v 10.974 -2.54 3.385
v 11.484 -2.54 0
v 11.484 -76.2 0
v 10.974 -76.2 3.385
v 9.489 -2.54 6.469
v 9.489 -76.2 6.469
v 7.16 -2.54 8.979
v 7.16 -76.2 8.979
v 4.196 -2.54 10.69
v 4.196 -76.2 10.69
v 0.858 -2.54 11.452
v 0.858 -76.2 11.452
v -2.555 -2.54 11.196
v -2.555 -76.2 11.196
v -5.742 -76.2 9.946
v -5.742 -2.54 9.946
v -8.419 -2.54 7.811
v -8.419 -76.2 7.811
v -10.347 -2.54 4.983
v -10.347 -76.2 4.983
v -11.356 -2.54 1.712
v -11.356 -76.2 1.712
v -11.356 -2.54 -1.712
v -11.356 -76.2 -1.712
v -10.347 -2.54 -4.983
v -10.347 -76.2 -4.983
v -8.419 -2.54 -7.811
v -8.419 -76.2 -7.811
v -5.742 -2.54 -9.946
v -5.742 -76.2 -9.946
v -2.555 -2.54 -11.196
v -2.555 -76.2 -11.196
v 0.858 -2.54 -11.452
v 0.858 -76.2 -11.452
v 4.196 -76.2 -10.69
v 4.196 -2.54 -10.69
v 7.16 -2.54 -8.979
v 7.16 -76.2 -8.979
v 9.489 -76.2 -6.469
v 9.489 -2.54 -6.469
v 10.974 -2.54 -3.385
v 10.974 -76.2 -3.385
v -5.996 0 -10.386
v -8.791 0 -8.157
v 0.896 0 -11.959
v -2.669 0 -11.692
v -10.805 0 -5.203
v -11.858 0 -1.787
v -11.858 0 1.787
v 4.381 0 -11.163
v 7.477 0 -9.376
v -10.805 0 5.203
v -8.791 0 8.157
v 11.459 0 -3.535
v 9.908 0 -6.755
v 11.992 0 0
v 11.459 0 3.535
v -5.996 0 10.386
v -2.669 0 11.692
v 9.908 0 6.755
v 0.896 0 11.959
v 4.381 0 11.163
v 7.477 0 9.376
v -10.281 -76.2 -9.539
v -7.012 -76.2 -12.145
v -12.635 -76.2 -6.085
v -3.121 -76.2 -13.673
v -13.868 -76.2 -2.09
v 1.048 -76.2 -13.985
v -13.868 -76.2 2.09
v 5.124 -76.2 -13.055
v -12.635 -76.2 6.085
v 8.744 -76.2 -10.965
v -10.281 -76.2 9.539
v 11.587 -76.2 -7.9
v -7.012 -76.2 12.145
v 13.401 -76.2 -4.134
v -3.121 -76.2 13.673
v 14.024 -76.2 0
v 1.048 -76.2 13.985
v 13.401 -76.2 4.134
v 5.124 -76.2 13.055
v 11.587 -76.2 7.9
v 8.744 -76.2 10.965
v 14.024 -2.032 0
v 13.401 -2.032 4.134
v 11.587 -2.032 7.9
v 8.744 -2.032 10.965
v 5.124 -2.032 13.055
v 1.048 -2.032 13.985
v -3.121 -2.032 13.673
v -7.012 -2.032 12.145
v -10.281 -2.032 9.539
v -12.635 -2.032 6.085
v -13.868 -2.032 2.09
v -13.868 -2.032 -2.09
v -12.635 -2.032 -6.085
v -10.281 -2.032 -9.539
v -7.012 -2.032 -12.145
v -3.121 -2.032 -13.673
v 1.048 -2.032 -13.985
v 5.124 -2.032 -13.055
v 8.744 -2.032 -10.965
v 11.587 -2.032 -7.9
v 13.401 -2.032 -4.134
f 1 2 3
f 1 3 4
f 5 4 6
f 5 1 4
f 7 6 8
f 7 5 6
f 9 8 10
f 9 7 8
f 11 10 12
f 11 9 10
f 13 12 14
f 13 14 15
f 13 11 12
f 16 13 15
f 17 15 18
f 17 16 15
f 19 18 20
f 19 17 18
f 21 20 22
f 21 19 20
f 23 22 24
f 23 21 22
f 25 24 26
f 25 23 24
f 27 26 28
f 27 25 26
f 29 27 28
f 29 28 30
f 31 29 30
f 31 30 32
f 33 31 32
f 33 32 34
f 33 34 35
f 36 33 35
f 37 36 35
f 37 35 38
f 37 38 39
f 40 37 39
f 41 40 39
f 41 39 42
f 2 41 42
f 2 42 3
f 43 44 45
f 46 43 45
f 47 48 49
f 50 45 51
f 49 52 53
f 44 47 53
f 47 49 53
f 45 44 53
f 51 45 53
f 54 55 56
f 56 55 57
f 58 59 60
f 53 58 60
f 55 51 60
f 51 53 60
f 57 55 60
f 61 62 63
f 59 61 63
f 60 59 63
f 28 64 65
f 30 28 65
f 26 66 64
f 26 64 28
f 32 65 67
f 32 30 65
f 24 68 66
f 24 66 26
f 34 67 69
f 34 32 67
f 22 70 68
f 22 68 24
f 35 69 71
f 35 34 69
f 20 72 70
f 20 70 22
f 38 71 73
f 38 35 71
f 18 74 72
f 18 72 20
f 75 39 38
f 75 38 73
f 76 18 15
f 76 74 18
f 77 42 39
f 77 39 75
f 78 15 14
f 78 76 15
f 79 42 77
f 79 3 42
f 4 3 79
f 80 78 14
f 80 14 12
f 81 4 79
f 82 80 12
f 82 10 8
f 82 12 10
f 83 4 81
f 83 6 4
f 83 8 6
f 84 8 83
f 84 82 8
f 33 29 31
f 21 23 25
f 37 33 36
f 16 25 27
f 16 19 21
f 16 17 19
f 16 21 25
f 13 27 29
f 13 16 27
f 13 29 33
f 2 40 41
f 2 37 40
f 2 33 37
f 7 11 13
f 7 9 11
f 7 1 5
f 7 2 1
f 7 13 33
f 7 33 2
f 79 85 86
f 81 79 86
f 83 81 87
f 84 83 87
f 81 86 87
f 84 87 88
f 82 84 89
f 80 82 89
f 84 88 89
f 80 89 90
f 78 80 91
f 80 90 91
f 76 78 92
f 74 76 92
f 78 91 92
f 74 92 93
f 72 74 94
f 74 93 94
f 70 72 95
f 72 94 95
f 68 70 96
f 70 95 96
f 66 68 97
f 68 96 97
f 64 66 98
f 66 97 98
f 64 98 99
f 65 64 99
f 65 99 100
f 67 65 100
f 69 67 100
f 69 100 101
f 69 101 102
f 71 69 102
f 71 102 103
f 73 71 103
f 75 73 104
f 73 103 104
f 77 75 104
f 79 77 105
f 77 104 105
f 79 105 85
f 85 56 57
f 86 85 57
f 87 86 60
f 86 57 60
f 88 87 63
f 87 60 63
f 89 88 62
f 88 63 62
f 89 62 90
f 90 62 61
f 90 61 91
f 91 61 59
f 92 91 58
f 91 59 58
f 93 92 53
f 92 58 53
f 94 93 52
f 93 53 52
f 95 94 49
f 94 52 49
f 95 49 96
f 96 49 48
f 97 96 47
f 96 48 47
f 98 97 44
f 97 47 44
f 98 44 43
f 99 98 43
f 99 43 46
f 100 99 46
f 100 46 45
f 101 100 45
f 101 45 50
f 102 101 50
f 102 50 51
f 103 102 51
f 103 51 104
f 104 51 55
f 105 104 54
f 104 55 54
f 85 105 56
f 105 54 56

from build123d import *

# Parameters (mm, degrees)
F2_R     = 14.024247
F0_DEPTH = 76.2
F1_T     = -2.54
F3_SIZE  = 2.032


with BuildPart() as f0:
    # F2 (on Front) → F0 (new body)
    with BuildSketch(Plane.XZ):
        Circle(F2_R)
    extrude(amount=F0_DEPTH)

    # F1
    f1_openings = [f0.faces().sort_by_distance(p)[0] for p in [
        (0, -76.2, 0),
    ]]
    offset(amount=F1_T, openings=f1_openings)

    # F3
    f3_edges = [f0.edges().sort_by_distance(p)[0] for p in [
        (-14.024247, 0, 0),
    ]]
    chamfer(f3_edges, length=F3_SIZE)


solid = f0.part
